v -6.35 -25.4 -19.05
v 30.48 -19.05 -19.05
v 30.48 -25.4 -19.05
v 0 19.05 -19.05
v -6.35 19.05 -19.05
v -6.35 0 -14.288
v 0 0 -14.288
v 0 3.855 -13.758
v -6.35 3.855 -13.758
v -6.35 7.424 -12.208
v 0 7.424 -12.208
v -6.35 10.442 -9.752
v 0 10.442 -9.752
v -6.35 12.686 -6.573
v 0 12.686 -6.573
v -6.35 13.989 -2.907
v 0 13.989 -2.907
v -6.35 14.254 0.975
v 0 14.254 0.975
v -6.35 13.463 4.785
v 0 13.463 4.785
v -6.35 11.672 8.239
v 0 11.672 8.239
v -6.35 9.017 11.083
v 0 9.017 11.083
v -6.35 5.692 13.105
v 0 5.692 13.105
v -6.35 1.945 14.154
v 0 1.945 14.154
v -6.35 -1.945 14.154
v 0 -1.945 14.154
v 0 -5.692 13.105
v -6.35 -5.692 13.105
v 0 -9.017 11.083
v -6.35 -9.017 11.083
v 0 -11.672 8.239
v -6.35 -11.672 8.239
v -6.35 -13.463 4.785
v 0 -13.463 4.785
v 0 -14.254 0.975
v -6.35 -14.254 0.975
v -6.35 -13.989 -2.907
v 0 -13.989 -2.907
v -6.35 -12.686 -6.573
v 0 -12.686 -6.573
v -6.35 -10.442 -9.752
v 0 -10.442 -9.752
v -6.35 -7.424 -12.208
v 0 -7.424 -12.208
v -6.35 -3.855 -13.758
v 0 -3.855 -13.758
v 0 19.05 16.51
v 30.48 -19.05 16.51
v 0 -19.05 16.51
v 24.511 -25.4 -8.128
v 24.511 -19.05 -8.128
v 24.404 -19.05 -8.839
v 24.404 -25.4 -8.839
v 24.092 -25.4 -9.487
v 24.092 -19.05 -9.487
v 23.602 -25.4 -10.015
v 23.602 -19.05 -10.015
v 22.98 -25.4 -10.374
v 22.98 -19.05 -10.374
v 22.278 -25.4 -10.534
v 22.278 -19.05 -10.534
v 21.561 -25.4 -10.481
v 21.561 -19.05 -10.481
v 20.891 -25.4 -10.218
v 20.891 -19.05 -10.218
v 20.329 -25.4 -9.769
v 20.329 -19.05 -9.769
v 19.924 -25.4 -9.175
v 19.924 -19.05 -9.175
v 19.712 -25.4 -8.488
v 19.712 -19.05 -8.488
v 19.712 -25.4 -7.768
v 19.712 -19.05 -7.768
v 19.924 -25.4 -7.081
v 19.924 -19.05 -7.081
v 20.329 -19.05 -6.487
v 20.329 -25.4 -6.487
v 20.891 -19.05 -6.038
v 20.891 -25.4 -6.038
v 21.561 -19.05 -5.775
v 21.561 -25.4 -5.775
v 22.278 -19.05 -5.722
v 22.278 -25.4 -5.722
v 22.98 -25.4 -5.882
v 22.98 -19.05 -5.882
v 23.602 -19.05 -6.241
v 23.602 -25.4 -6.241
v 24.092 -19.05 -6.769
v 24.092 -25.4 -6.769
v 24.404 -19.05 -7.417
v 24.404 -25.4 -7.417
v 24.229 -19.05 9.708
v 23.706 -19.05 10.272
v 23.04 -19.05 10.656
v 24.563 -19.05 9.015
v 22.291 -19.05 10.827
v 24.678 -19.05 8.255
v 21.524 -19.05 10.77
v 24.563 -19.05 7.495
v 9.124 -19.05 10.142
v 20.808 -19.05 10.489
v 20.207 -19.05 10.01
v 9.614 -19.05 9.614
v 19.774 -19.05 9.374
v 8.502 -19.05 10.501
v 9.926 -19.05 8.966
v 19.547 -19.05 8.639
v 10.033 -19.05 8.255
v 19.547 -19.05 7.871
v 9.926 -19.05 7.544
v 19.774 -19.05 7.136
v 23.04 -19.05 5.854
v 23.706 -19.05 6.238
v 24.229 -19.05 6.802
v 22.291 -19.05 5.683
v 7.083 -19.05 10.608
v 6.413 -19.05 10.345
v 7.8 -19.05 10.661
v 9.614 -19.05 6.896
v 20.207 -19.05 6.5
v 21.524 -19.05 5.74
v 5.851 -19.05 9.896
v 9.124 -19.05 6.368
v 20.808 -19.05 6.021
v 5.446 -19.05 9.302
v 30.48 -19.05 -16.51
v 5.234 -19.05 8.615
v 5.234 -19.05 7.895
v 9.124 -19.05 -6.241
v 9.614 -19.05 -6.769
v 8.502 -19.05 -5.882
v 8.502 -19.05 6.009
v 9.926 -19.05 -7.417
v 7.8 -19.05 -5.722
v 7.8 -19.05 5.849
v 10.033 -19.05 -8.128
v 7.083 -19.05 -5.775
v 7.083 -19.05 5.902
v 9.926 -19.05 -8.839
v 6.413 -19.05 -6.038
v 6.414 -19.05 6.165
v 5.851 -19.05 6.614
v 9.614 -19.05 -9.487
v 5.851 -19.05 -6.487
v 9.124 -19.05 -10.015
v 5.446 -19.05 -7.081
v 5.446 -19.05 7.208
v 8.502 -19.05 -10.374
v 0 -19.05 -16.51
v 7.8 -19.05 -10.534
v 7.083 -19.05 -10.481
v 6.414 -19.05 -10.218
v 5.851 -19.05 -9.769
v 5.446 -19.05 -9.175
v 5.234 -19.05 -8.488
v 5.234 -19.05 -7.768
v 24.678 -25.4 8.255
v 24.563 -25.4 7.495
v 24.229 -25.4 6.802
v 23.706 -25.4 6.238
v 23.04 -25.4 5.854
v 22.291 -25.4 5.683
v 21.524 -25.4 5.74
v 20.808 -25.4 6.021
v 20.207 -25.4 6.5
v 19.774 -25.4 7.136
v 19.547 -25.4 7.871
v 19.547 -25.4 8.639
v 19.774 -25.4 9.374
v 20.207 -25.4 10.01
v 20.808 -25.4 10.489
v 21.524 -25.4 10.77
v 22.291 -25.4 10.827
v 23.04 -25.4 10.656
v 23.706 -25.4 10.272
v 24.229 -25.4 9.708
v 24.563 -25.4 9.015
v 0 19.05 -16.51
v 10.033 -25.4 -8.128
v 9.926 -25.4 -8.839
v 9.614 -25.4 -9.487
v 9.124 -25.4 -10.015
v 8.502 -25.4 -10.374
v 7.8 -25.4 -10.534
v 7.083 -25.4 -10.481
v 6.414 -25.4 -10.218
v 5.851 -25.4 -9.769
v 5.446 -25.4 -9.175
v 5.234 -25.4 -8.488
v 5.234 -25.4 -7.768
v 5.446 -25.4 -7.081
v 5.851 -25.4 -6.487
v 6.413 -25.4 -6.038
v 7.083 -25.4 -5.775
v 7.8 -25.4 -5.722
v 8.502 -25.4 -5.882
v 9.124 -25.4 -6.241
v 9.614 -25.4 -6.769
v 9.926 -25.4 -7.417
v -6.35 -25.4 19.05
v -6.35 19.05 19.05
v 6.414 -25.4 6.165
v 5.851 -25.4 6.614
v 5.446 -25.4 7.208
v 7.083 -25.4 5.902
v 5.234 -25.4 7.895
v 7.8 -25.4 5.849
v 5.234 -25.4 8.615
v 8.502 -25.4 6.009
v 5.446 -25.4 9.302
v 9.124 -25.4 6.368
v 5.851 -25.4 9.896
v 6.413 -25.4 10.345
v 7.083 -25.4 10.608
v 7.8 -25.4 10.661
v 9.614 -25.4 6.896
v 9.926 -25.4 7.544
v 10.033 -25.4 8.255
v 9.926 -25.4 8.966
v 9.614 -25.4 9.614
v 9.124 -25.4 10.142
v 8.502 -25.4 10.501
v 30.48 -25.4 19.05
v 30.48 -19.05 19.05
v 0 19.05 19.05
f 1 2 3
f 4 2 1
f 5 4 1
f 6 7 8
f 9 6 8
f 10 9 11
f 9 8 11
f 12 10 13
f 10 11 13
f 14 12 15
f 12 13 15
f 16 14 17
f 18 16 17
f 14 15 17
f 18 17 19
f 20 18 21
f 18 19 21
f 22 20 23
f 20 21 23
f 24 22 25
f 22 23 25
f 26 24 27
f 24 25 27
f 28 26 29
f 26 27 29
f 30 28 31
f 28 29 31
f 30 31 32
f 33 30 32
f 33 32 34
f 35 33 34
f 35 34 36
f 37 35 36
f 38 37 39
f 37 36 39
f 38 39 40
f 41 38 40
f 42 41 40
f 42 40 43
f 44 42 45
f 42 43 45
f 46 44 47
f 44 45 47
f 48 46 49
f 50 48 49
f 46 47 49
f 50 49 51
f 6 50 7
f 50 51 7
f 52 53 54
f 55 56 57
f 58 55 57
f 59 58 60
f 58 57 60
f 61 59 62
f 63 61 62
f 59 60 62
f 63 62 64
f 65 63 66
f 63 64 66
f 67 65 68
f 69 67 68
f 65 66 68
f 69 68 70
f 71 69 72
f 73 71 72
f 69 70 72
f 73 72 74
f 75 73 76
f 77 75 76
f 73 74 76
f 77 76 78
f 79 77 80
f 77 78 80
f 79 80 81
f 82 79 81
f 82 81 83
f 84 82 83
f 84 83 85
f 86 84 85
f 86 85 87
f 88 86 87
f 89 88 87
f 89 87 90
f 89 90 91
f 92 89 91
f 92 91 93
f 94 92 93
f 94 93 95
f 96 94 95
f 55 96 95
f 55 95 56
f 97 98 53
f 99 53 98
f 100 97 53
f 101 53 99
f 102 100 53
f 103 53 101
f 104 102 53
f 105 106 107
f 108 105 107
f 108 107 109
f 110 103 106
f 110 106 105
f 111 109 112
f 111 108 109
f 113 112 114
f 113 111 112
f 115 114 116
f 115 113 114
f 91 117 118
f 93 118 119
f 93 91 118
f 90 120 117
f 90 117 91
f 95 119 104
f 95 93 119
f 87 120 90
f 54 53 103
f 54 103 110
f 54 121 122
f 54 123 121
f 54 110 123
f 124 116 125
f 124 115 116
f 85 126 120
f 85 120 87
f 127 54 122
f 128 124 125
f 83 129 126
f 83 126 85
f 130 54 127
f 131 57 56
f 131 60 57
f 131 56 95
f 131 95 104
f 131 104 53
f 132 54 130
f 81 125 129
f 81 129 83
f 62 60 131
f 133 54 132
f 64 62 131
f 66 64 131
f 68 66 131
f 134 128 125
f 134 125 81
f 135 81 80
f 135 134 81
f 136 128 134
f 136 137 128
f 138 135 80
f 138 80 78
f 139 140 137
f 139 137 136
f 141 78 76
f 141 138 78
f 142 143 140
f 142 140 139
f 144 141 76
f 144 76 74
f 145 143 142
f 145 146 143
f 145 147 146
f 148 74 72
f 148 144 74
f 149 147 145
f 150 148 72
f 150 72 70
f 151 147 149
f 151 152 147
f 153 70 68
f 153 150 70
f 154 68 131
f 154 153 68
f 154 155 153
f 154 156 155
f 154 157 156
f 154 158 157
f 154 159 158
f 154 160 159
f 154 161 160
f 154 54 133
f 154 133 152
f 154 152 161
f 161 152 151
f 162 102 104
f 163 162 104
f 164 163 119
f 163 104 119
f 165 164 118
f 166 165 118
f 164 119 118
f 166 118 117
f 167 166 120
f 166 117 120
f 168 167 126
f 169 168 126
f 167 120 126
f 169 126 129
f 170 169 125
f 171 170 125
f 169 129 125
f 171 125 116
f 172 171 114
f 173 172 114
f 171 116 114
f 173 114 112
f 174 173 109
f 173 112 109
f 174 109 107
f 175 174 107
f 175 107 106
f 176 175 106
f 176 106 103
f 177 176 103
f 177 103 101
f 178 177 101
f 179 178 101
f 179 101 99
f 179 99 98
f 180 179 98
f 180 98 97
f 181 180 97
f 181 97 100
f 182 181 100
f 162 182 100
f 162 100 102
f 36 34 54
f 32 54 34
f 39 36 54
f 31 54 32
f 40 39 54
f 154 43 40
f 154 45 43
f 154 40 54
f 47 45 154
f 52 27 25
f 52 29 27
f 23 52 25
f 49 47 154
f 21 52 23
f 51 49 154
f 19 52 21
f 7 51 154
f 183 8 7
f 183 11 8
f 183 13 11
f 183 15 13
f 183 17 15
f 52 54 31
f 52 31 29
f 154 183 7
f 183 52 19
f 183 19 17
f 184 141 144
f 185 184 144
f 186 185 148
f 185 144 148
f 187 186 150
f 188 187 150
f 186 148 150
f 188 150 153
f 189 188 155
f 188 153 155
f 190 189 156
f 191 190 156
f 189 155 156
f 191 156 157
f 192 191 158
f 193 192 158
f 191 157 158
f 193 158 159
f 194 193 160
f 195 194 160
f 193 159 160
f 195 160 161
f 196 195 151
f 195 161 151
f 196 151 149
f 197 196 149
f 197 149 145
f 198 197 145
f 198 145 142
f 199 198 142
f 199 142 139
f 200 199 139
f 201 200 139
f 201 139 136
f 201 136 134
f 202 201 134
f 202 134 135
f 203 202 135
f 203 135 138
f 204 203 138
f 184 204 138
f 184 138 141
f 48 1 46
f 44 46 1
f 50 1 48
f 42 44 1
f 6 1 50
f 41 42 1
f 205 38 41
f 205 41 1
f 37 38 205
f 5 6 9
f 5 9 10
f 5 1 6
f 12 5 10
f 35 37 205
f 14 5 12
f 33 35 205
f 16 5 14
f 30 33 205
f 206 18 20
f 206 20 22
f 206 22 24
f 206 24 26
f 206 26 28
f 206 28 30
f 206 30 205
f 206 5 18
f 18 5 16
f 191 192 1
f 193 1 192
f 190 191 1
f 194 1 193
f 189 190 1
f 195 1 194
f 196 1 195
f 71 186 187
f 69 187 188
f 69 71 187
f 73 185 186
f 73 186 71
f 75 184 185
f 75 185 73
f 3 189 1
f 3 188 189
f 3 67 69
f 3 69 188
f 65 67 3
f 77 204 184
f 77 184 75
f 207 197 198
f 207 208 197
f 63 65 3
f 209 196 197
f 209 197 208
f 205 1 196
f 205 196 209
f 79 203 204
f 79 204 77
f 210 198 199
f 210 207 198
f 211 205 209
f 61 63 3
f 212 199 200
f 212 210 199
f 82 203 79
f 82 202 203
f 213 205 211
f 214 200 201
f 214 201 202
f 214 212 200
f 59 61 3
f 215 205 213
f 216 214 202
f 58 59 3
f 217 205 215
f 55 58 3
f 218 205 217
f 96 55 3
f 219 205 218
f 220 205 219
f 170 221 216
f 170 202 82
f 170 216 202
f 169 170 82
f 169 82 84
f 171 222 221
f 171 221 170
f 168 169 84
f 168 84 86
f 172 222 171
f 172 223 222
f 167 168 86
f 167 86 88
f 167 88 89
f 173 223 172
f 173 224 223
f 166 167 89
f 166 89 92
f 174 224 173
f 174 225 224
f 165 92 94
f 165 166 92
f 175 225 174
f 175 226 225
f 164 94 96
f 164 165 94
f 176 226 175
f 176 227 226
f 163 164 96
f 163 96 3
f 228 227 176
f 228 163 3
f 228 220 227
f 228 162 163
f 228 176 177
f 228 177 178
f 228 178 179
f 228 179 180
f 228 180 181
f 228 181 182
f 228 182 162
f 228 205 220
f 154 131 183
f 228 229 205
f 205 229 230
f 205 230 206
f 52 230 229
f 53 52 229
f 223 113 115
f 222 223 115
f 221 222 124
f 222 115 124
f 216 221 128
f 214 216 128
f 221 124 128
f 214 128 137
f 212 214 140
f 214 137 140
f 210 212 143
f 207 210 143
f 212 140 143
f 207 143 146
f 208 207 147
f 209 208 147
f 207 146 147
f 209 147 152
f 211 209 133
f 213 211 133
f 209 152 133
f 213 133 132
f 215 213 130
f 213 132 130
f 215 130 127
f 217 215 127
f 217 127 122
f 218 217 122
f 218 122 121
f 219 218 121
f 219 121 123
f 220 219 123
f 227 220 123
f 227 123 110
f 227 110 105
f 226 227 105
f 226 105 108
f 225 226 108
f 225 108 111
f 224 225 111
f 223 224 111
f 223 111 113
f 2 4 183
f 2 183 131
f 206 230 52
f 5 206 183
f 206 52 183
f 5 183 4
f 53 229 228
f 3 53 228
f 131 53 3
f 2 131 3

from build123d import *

# Parameters (mm, degrees)
SKETCH1_W           = 38.1
SKETCH1_H           = 6.35
BOSS_EXTRUDE1_DEPTH = 30.48
SKETCH1_3_W         = 38.1
SKETCH1_3_H         = 38.1
SKETCH1_3_R         = 14.2875
BOSS_EXTRUDE2_DEPTH = 6.35
SKETCH3_W           = 6.35
SKETCH3_H           = 38.1
BOSS_EXTRUDE3_DEPTH = 6.35
BOSS_EXTRUDE4_DEPTH = 2.54
BOSS_EXTRUDE5_DEPTH = 2.54
SKETCH6_R           = 2.413
SKETCH6_R_2         = 2.5796875
CUT_EXTRUDE1_DEPTH  = 7.35


with BuildPart() as part:
    # Sketch1 → Boss-Extrude1 (new body)
    with BuildSketch(Plane(origin=(0, 0, 0), x_dir=(0, 0, -1), z_dir=(1, 0, 0))):
        with Locations((0, -22.225)):
            Rectangle(SKETCH1_W, SKETCH1_H)
    extrude(amount=BOSS_EXTRUDE1_DEPTH)



with BuildPart() as body_2:
    # Sketch1<3> → Boss-Extrude2 (new body)
    with BuildSketch(Plane(origin=(0, 0, 0), x_dir=(0, 0, -1), z_dir=(1, 0, 0))):
        Rectangle(SKETCH1_3_W, SKETCH1_3_H)
        Circle(SKETCH1_3_R, mode=Mode.SUBTRACT)
    extrude(amount=-BOSS_EXTRUDE2_DEPTH)


with BuildPart() as part_1:
    add(part.part)

    add(body_2.part)  # Boss-Extrude3 merges body 2
    # Sketch3 → Boss-Extrude3 (add)
    with BuildSketch(Plane.XZ.offset(19.05)):
        with Locations((-3.175, 0)):
            Rectangle(SKETCH3_W, SKETCH3_H)
    extrude(amount=BOSS_EXTRUDE3_DEPTH)

    # Sketch4 → Boss-Extrude4 (add)
    with BuildSketch(Plane.XY.offset(19.05)):
        Polygon((0, 19.05), (30.48, -19.05), (0, -19.05), align=None)
    extrude(amount=-BOSS_EXTRUDE4_DEPTH)

    # Sketch5 → Boss-Extrude5 (add)
    with BuildSketch(Plane(origin=(0, 0, -19.05), x_dir=(-1, 0, 0), z_dir=(0, 0, -1))):
        Polygon((0, 19.05), (-30.48, -19.05), (0, -19.05), align=None)
    extrude(amount=-BOSS_EXTRUDE5_DEPTH)

    # Sketch6 → Cut-Extrude1 (cut, through all)
    with BuildSketch(Plane(origin=(0, -19.05, 0), x_dir=(1, 0, 0), z_dir=(0, 1, 0))):
        with Locations((7.62, -8.255)):
            Circle(SKETCH6_R)
        with Locations((22.098, -8.255)):
            Circle(SKETCH6_R_2)
        with Locations((22.098, 8.128)):
            Circle(SKETCH6_R)
        with Locations((7.62, 8.128)):
            Circle(SKETCH6_R)
    extrude(amount=-CUT_EXTRUDE1_DEPTH, mode=Mode.SUBTRACT)


solid = part_1.part
